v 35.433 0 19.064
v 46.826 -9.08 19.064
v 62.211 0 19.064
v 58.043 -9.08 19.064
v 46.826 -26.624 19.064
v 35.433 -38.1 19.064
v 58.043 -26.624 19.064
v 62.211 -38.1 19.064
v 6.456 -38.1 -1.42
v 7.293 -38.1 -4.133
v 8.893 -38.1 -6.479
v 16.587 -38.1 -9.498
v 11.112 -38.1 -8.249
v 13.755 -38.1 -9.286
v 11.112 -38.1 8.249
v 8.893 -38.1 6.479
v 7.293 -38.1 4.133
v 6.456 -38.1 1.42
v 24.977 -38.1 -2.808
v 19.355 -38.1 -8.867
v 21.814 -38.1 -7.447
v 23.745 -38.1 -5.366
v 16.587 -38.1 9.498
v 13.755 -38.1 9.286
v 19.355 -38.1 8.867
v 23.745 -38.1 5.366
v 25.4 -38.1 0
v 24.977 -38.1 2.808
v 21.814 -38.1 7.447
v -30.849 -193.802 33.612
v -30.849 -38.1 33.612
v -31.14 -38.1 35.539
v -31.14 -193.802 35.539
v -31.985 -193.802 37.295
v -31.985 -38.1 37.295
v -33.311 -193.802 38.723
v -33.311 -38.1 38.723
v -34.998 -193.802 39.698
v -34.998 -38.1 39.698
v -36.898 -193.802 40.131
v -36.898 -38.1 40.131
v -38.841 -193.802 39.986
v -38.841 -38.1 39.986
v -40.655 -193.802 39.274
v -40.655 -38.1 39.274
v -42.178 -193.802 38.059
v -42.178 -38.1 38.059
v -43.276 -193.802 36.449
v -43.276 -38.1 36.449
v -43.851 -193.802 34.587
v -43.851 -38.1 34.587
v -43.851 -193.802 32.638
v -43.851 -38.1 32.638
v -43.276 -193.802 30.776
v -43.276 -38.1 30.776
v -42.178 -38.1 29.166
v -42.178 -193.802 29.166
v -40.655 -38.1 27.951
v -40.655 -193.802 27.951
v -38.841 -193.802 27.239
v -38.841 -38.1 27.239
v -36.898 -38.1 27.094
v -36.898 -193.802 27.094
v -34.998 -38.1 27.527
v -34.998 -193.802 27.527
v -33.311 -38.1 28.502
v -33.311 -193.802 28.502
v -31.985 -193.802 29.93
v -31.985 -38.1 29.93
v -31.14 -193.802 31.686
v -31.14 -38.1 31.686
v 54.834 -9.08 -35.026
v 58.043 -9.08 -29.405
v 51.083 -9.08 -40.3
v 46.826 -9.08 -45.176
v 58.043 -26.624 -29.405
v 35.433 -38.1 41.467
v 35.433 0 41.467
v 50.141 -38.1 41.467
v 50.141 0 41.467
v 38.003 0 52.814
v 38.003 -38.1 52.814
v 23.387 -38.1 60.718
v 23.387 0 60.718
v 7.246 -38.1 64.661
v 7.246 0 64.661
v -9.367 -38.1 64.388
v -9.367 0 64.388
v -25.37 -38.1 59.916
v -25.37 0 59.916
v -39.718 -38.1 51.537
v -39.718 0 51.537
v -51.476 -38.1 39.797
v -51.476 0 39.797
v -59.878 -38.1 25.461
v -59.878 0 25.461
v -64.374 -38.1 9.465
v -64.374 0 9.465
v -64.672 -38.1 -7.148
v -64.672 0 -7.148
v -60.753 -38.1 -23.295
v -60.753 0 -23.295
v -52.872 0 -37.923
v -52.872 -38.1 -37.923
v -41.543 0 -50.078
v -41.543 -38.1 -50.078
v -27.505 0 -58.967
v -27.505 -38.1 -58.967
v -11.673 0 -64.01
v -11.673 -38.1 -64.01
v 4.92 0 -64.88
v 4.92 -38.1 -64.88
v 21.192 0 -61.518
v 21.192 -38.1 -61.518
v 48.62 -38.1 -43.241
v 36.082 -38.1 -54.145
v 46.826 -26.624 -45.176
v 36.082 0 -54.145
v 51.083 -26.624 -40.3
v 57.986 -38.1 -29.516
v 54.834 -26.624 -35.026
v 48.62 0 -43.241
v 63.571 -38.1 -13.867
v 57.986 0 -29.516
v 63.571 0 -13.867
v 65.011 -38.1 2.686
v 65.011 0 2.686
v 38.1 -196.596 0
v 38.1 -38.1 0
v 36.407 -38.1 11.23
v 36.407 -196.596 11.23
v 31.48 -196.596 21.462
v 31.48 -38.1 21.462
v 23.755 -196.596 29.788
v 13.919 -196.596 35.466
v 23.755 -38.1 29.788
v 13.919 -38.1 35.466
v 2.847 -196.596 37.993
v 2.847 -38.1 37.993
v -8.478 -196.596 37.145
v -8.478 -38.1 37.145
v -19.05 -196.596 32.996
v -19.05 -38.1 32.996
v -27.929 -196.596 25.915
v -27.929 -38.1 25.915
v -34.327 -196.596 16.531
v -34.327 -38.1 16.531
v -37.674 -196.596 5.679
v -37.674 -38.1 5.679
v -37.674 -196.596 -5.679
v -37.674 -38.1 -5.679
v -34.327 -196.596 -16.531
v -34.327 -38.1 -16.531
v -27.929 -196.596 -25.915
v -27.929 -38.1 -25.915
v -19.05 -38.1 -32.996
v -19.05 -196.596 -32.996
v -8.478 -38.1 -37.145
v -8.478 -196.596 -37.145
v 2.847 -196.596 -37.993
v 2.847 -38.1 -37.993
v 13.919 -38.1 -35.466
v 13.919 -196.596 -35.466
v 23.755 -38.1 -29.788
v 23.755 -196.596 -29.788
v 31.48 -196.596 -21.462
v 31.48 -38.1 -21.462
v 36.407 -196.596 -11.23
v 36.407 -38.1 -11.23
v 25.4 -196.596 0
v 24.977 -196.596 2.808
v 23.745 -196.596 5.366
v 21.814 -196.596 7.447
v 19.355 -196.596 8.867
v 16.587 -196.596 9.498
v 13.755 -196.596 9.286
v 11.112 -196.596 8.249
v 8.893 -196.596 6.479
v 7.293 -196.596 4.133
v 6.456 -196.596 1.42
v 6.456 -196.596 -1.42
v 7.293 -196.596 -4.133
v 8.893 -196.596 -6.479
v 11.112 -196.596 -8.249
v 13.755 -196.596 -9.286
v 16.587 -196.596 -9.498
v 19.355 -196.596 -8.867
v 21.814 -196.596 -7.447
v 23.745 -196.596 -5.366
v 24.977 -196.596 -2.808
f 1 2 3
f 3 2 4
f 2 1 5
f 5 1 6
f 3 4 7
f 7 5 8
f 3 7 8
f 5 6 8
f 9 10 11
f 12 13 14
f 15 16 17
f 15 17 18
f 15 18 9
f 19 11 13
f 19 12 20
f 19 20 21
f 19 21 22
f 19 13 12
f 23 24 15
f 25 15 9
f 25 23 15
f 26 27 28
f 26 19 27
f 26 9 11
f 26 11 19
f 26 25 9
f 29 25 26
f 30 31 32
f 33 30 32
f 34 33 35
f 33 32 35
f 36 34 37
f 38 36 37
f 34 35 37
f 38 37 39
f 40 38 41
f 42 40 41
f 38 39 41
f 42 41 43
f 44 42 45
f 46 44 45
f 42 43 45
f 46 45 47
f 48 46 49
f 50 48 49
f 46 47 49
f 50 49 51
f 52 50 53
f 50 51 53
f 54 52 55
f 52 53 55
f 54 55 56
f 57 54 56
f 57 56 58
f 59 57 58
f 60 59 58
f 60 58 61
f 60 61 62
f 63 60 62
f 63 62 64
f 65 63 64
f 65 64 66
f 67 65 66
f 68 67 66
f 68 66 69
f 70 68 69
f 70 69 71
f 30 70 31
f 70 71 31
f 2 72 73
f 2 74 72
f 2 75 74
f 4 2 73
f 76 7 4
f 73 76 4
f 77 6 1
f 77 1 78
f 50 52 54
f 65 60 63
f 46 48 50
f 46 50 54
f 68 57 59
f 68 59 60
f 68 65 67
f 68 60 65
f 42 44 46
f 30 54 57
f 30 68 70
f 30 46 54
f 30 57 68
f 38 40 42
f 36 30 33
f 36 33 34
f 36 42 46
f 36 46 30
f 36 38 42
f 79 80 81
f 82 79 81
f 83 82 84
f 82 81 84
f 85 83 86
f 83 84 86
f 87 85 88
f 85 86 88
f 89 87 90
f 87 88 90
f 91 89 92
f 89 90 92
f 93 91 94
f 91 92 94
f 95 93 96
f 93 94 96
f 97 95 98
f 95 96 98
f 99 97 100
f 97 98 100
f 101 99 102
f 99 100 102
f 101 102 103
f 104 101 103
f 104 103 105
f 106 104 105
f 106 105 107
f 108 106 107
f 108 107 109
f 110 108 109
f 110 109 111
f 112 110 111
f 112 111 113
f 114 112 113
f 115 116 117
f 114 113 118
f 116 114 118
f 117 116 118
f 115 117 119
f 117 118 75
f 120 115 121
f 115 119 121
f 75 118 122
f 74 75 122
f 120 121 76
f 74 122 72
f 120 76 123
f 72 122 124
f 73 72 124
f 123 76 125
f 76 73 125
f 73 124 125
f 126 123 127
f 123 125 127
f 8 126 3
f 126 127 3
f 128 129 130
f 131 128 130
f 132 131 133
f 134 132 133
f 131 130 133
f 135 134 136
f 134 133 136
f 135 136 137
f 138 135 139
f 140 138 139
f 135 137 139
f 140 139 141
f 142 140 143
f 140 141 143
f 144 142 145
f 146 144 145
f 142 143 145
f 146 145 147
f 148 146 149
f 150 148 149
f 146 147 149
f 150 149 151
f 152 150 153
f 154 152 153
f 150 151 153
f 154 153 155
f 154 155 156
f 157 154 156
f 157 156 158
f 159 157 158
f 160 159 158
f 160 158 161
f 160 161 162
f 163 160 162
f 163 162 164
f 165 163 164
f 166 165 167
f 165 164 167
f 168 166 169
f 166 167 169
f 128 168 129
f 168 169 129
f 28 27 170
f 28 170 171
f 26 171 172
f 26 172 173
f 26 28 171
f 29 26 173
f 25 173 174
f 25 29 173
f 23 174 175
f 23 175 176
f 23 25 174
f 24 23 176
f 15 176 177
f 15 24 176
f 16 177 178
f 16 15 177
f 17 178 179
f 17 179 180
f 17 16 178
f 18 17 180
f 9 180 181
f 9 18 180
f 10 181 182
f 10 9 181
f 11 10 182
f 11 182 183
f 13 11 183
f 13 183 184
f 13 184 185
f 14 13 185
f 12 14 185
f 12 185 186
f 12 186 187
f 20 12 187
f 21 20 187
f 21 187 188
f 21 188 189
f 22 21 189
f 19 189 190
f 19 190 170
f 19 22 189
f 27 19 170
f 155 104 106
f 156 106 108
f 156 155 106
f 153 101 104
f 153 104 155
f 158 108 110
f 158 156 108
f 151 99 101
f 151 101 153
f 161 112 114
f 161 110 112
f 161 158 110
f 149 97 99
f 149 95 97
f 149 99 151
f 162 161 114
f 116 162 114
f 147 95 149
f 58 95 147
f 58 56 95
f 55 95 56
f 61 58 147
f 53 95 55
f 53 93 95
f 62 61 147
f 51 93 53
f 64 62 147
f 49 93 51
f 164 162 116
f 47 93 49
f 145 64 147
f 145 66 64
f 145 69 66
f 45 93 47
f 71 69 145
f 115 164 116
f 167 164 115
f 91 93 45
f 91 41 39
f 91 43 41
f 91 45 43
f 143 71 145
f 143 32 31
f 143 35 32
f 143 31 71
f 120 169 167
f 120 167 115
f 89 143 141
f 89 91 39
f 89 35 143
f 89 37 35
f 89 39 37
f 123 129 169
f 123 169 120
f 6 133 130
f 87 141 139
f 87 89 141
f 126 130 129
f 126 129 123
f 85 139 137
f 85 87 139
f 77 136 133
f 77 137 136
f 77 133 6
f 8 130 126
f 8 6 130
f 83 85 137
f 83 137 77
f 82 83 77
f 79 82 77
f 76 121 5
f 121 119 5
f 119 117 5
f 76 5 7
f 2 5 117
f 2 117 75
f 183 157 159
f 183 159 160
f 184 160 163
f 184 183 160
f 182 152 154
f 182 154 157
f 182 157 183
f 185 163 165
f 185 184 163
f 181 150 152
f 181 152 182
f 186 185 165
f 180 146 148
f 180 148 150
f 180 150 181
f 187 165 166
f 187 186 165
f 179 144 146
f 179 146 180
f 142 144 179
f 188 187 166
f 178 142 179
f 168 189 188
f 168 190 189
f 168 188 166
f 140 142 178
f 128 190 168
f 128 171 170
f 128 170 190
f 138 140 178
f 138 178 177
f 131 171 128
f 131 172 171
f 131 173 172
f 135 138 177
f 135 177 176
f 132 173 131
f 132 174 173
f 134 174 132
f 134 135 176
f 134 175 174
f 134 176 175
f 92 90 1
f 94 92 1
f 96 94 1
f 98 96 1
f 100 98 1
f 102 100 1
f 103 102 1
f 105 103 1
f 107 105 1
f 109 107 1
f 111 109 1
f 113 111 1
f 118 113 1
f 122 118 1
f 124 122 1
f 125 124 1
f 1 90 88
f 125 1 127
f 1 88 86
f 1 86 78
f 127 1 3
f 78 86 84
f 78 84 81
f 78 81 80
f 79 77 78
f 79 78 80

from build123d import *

# Parameters (mm, degrees)
F0_R     = 65.066172
F1_DEPTH = 38.1
F2_R     = 38.1
F2_R_2   = 9.525
F3_DEPTH = 158.496
F4_R     = 6.537094
F5_DEPTH = 155.702
F6_W     = 100.18133
F6_H     = 22.402564
F7_DEPTH = 38.101
F8_W     = 11.216447
F8_H     = 17.543803
F9_DEPTH = 84.131507


with BuildPart() as f1:
    # F0 (on Front) → F1 (new body)
    with BuildSketch(Plane.XZ):
        Circle(F0_R)
    extrude(amount=F1_DEPTH)

    # F2 (on face) → F3 (join)
    with BuildSketch(Plane.XZ.offset(38.1)):
        Circle(F2_R)
        with Locations((15.875, 0)):
            Circle(F2_R_2, mode=Mode.SUBTRACT)
    extrude(amount=F3_DEPTH)

    # F4 (on face) → F5 (join)
    with BuildSketch(Plane.XZ.offset(38.1)):
        with Locations((-37.386458, 33.612467)):
            Circle(F4_R)
    extrude(amount=F5_DEPTH)

    # F6 (on face) → F7 (cut, through all)
    with BuildSketch(Plane.XZ.offset(38.1)):
        with Locations((85.523775, 30.265617)):
            Rectangle(F6_W, F6_H)
    extrude(amount=-F7_DEPTH, mode=Mode.SUBTRACT)

    # F8 (on face) → F9 (cut, through all)
    with BuildSketch(Plane.XY.offset(19.064335)):
        with Locations((52.434615, -17.852365)):
            Rectangle(F8_W, F8_H)
    extrude(amount=-F9_DEPTH, mode=Mode.SUBTRACT)


solid = f1.part
